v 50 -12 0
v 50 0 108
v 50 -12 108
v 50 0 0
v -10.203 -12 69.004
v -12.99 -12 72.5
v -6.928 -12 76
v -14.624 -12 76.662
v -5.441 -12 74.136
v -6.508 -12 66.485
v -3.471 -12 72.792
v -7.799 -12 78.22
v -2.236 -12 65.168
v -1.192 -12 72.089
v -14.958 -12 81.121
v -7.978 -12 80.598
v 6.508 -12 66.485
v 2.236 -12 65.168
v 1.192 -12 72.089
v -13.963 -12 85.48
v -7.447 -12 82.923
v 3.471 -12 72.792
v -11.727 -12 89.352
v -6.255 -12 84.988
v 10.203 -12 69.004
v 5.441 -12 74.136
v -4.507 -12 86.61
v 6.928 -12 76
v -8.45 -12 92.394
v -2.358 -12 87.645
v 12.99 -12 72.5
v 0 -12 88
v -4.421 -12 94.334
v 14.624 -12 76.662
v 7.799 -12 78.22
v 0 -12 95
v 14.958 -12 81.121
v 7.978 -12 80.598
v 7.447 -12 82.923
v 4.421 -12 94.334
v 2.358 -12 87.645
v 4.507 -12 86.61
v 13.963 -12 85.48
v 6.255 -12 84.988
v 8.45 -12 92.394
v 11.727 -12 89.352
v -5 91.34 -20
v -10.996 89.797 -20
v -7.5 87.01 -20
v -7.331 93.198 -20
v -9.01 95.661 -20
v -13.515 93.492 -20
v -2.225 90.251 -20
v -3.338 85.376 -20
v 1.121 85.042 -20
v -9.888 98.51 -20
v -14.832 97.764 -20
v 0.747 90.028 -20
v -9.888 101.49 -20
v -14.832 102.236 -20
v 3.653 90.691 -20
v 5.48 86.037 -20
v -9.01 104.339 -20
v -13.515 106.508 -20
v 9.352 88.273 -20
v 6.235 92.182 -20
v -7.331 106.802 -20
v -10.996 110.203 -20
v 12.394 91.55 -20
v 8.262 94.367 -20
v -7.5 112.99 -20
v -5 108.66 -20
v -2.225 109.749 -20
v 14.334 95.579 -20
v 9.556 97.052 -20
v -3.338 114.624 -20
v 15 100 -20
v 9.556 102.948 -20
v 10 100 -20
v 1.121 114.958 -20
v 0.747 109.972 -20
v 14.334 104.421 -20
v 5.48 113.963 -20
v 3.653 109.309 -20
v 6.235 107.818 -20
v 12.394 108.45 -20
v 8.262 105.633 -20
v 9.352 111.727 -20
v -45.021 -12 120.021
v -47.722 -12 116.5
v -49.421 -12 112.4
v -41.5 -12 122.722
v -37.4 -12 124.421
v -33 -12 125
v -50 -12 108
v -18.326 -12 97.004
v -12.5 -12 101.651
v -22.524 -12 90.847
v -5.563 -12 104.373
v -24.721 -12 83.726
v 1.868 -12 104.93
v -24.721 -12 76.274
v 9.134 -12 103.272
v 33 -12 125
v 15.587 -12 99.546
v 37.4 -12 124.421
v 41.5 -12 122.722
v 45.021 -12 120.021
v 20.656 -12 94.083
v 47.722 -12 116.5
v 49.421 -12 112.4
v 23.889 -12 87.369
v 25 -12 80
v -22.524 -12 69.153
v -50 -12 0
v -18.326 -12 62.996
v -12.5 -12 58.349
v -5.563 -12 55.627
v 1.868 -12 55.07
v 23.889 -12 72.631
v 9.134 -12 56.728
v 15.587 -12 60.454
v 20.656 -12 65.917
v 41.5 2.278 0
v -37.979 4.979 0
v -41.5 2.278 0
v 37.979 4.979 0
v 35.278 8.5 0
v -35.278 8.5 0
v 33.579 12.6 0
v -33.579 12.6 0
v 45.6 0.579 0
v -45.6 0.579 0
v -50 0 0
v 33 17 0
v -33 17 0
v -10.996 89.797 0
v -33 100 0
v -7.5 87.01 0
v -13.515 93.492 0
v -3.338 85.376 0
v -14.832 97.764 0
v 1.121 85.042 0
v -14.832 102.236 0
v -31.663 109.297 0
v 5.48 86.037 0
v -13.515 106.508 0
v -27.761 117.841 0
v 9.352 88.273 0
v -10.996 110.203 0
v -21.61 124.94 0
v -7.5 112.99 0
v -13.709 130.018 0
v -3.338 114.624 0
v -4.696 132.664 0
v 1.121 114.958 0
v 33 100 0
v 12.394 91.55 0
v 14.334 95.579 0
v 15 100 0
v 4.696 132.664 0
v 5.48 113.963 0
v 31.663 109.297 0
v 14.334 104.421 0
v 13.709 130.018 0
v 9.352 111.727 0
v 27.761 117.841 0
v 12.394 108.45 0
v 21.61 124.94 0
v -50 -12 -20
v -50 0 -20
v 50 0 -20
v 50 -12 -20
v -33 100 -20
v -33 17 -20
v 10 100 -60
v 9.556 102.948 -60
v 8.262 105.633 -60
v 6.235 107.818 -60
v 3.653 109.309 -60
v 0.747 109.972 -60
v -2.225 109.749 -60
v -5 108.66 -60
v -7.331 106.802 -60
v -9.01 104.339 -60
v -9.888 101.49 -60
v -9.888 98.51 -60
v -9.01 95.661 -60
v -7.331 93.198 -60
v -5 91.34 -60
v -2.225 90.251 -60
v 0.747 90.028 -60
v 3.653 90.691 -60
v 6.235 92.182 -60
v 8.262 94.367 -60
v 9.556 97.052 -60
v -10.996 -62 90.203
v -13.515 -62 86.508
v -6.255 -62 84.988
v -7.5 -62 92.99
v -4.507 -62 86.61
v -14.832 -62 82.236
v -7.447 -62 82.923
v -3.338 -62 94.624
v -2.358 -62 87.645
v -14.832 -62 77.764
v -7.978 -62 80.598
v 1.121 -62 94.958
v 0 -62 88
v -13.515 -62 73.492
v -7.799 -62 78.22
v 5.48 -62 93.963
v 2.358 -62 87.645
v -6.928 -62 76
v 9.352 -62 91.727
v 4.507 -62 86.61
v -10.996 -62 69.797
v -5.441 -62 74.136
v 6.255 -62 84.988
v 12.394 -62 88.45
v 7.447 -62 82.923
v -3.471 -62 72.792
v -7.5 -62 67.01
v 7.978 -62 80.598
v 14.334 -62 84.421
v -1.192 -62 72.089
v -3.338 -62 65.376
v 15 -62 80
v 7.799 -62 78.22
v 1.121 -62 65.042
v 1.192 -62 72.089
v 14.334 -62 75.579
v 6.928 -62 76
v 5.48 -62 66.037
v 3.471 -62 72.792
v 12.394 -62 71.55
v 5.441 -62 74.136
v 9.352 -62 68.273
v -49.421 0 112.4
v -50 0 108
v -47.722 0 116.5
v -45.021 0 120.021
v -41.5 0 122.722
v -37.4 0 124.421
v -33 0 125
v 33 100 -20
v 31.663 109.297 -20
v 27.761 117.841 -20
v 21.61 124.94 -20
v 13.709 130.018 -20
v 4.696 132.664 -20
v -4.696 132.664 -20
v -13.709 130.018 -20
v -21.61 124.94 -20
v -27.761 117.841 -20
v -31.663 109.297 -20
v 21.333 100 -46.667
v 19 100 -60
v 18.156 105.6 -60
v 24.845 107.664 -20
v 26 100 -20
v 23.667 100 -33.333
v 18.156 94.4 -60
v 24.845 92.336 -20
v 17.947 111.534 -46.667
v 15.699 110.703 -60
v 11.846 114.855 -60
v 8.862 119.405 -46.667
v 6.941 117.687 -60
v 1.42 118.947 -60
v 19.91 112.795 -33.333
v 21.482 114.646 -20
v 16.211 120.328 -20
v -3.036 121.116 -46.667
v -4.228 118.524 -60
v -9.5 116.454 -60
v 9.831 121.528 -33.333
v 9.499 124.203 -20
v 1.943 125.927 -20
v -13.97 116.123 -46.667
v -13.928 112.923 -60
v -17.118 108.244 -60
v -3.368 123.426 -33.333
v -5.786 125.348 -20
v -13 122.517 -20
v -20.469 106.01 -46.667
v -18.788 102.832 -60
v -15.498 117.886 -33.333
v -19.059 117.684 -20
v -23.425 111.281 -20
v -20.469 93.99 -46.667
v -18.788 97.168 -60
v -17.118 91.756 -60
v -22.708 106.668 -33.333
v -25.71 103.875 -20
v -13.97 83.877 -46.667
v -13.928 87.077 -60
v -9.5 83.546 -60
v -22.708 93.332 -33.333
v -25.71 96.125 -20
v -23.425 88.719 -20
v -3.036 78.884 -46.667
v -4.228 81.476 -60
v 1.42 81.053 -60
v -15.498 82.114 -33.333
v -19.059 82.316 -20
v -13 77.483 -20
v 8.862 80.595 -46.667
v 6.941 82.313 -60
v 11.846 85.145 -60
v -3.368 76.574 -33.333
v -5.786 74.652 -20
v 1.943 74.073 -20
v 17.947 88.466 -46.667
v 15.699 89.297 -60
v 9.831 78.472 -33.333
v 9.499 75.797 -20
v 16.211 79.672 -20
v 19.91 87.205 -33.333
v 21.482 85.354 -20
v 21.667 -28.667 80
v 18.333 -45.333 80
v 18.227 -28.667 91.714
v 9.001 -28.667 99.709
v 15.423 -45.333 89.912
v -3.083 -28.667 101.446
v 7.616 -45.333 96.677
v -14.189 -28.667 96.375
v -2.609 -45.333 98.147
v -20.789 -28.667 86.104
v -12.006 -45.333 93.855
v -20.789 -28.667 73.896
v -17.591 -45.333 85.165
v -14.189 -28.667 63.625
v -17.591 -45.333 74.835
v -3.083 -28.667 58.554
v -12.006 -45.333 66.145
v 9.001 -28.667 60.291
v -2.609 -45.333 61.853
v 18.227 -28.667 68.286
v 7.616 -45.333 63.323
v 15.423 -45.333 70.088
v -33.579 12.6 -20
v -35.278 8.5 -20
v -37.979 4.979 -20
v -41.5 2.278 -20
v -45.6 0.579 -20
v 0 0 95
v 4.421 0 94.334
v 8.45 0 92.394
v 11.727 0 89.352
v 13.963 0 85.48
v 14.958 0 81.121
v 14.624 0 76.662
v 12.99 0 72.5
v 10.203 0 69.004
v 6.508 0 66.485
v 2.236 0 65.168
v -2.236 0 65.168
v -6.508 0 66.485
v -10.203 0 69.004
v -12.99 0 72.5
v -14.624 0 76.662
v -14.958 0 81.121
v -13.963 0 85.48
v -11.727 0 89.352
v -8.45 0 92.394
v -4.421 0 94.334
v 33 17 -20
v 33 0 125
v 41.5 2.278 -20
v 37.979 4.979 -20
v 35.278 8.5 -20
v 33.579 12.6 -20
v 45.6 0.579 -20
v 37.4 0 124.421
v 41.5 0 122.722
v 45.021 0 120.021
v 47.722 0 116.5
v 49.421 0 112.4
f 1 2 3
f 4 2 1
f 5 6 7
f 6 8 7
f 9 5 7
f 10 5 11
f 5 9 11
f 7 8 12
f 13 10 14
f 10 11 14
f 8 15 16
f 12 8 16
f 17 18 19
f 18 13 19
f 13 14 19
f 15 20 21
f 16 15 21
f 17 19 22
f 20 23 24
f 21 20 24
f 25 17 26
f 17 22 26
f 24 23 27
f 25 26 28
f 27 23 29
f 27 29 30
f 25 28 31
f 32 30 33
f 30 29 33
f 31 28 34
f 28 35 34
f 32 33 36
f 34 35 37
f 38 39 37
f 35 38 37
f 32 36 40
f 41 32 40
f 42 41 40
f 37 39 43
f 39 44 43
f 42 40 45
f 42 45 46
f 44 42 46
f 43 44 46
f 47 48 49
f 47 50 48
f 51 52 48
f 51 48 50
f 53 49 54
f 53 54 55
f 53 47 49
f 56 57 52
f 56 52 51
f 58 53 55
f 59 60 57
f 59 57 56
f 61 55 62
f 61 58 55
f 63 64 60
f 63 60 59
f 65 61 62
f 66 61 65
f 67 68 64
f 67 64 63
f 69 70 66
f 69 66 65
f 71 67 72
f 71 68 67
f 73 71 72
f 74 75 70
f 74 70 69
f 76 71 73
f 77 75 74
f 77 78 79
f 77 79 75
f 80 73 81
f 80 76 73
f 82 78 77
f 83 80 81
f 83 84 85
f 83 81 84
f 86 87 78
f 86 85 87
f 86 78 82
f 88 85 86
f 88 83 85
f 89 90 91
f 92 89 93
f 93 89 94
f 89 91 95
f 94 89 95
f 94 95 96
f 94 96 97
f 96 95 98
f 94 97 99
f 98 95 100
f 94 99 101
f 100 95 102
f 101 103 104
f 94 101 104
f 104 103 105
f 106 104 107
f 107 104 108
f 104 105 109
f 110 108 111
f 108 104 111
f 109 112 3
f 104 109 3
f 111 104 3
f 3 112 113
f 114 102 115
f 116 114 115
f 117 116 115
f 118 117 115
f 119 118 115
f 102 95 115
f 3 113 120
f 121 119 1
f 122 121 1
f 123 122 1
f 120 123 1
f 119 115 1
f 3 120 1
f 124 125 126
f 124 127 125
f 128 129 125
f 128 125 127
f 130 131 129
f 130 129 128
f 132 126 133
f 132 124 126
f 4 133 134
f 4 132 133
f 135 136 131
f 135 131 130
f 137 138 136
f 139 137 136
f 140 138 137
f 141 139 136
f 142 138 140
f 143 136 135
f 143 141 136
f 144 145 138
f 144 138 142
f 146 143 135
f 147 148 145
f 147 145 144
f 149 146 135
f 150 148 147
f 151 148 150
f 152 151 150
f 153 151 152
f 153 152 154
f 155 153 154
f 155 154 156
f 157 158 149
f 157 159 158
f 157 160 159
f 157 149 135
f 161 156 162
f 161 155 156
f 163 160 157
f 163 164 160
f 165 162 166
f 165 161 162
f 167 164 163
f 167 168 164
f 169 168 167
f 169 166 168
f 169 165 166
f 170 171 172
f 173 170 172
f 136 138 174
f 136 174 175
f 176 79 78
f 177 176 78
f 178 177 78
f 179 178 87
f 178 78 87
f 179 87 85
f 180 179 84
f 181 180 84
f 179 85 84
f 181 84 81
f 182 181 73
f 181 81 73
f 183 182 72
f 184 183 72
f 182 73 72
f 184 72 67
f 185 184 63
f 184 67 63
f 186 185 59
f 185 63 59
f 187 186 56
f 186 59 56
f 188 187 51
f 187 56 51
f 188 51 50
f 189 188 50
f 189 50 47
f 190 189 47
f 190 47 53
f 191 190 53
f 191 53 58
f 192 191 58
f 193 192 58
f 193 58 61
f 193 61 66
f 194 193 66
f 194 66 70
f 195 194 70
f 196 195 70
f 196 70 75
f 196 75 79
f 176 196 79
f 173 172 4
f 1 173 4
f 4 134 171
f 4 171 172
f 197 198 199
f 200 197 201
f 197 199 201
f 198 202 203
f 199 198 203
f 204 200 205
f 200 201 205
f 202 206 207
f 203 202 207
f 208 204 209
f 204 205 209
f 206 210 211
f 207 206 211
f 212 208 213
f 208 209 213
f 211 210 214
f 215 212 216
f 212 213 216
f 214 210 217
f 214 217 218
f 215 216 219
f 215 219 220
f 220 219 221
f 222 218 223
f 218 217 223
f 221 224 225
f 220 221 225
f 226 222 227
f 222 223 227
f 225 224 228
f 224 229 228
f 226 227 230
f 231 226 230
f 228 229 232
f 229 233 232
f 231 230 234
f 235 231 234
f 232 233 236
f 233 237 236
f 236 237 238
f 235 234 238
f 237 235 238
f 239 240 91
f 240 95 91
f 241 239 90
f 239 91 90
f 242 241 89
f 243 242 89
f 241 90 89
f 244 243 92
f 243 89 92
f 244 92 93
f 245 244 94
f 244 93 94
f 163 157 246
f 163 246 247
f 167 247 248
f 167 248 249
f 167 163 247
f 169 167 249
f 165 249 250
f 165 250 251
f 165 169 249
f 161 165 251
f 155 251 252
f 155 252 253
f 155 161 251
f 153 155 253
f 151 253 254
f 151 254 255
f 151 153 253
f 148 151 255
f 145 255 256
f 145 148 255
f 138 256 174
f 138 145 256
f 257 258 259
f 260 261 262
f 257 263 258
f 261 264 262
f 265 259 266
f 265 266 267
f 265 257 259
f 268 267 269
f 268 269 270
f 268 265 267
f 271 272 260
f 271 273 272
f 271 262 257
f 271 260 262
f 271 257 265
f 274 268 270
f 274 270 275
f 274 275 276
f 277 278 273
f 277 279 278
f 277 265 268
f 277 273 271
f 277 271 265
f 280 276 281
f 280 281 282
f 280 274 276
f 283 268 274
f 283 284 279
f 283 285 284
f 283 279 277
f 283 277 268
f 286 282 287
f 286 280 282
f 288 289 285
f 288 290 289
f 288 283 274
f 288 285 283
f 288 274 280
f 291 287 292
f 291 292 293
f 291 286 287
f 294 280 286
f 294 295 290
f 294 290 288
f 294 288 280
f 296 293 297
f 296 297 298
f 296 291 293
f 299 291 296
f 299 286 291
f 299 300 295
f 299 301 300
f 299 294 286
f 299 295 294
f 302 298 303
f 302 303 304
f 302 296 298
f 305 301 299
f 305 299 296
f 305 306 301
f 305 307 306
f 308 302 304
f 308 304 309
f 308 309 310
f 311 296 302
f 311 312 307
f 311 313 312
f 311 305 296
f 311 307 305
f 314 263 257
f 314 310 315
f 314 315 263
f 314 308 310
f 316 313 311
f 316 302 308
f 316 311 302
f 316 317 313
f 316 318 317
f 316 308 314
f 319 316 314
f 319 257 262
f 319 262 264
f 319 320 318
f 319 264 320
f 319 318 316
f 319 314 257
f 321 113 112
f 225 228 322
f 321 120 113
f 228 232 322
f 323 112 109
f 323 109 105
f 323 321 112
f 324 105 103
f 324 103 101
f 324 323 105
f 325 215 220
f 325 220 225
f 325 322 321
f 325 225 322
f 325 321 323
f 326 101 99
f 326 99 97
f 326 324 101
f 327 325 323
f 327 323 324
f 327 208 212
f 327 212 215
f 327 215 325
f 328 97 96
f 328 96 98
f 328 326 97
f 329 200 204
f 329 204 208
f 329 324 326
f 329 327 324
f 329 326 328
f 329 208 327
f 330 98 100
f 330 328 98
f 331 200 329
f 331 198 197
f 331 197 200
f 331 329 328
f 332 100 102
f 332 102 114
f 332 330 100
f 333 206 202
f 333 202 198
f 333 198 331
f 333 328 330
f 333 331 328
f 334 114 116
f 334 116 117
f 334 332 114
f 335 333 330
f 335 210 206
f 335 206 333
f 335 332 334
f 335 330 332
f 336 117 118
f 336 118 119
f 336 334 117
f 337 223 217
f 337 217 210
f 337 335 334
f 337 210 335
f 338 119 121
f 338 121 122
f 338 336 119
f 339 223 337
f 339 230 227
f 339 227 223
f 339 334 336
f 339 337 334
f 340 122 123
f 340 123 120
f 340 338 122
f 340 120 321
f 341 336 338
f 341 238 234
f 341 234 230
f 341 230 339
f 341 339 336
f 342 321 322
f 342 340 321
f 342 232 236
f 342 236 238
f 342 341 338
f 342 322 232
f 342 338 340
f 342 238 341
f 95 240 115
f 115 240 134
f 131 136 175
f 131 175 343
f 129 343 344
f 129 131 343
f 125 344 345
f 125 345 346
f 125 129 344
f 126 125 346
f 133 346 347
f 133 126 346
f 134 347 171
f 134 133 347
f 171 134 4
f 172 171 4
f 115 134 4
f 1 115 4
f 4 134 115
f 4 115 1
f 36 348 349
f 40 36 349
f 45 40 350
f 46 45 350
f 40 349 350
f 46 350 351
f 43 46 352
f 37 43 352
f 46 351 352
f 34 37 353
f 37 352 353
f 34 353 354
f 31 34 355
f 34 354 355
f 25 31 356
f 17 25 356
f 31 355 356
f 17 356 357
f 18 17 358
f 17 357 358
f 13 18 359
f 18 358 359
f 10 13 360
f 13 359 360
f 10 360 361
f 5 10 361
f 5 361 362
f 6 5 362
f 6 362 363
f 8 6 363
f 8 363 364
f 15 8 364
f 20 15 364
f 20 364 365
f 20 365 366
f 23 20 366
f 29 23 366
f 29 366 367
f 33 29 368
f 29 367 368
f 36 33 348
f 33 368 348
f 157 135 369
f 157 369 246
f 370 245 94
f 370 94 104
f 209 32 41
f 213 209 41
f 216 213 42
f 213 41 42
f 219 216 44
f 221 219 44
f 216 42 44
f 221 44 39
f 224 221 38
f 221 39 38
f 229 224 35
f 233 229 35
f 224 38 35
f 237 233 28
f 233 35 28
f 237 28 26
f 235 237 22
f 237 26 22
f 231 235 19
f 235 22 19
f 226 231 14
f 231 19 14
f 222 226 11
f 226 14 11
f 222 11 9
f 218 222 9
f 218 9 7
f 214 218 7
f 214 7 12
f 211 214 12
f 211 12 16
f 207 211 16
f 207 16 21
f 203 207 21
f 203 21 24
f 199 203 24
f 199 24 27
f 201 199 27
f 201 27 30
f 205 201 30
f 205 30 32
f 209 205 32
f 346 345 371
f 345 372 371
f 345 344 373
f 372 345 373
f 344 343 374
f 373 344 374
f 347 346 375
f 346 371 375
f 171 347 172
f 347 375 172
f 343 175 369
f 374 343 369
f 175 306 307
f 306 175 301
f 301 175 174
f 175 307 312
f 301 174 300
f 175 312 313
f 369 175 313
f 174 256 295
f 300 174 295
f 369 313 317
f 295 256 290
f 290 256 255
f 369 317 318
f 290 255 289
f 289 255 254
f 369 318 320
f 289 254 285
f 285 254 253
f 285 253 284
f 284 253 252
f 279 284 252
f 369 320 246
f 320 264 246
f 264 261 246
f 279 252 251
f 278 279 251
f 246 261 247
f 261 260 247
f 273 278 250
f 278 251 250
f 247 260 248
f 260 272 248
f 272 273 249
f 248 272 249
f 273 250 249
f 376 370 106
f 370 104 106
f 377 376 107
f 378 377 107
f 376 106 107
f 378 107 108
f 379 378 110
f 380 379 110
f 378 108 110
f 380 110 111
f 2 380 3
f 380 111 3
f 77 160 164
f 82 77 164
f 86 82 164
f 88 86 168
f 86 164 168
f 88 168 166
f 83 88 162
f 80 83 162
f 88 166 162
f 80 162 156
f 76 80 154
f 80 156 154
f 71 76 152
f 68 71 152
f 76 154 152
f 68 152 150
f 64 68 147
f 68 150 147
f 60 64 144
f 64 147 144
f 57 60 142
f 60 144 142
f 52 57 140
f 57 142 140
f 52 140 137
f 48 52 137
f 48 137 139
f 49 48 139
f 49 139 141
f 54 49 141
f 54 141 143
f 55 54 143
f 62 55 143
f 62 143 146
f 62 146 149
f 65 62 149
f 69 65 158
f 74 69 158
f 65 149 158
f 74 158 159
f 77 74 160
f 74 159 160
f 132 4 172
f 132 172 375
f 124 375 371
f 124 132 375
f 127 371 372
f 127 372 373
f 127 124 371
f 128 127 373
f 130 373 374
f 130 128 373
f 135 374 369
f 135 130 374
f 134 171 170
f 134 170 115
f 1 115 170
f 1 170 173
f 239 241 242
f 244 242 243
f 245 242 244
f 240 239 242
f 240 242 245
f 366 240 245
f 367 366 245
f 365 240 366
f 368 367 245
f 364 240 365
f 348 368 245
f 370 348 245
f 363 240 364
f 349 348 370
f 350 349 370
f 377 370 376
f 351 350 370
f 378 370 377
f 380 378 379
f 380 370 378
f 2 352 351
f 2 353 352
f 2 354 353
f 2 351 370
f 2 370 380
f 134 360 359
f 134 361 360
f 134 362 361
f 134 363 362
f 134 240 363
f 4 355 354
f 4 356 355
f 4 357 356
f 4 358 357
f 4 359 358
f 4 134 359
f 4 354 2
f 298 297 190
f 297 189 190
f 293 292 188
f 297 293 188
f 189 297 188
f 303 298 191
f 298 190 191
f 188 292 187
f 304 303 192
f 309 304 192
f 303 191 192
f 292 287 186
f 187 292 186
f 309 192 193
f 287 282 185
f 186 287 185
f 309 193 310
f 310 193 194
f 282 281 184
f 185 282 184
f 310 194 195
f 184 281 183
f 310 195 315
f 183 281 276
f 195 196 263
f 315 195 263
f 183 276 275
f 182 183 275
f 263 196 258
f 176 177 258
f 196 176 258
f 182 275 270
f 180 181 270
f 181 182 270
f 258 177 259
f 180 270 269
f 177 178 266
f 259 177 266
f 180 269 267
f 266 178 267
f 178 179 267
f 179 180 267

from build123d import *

# Parameters (mm, degrees)
CROQUIS1_R              = 15
SALIENTE_EXTRUIR1_DEPTH = 20
CROQUIS4_R              = 19
CROQUIS3_R              = 26
CROQUIS5_R              = 10
CORTAR_EXTRUIR1_DEPTH   = 148.610975229
CROQUIS6_W              = 100
CROQUIS6_H              = 125
CROQUIS6_R              = 15
SALIENTE_EXTRUIR2_DEPTH = 12
REDONDEO1_R             = 17
CROQUIS9_R              = 25
CROQUIS8_R              = 15
CROQUIS10_R             = 8
CORTAR_EXTRUIR2_DEPTH   = 198.863589374
CROQUIS11_W             = 100
CROQUIS11_H             = 20
SALIENTE_EXTRUIR3_DEPTH = 12


with BuildPart() as part:
    # Croquis1 → Saliente-Extruir1 (new body)
    with BuildSketch(Plane.XY):
        with BuildLine():
            Line((-50, 0), (50, 0))
            ThreePointArc((50, 0), (37.97918472, 4.97918472), (33, 17))
            Line((33, 17), (33, 100))
            ThreePointArc((33, 100), (0, 133), (-33, 100))
            Line((-33, 100), (-33, 17))
            ThreePointArc((-33, 17), (-37.97918472, 4.97918472), (-50, 0))
        make_face()
        with Locations((0, 100)):
            Circle(CROQUIS1_R, mode=Mode.SUBTRACT)
    extrude(amount=-SALIENTE_EXTRUIR1_DEPTH)

    # Croquis4 → Recubrir1 section 0
    with BuildSketch(Plane.XY.offset(-60)):
        with Locations((0, 100)):
            Circle(CROQUIS4_R)
    # Croquis3 → Recubrir1 section 1
    with BuildSketch(Plane.XY.offset(-20)):
        with Locations((0, 100)):
            Circle(CROQUIS3_R)
    loft()

    # Croquis5 → Cortar-Extruir1 (cut, through all)
    with BuildSketch(Plane.XY.offset(-20)):
        with Locations((0, 100)):
            Circle(CROQUIS5_R)
    extrude(amount=-CORTAR_EXTRUIR1_DEPTH, mode=Mode.SUBTRACT)


with BuildPart() as body_2:
    # Croquis6 → Saliente-Extruir2 (new body)
    with BuildSketch(Plane(origin=(0, 0, 0), x_dir=(1, 0, 0), z_dir=(0, 1, 0))):
        with Locations((0, -62.5)):
            Rectangle(CROQUIS6_W, CROQUIS6_H)
        with Locations(Location((0, -80, 0), (0, 0, 270))):
            Circle(CROQUIS6_R, mode=Mode.SUBTRACT)
    extrude(amount=-SALIENTE_EXTRUIR2_DEPTH)

    # Redondeo1
    redondeo1_edges = [body_2.edges().sort_by_distance(p)[0] for p in [
        (50, -6, 125),
        (-50, -6, 125),
    ]]
    fillet(redondeo1_edges, radius=REDONDEO1_R)

    # Croquis9 → Recubrir2 section 0
    with BuildSketch(Plane.XZ.offset(12)):
        with Locations((0, 80)):
            Circle(CROQUIS9_R)
    # Croquis8 → Recubrir2 section 1
    with BuildSketch(Plane(origin=(0, -62, 0), x_dir=(1, 0, 0), z_dir=(0, 1, 0))):
        with Locations((0, -80)):
            Circle(CROQUIS8_R)
    loft()

    # Croquis10 → Cortar-Extruir2 (cut, through all)
    with BuildSketch(Plane(origin=(0, -12, 0), x_dir=(1, 0, 0), z_dir=(0, 1, 0))):
        with Locations(Location((0, -80, 0), (0, 0, 270))):
            Circle(CROQUIS10_R)
    extrude(amount=-CORTAR_EXTRUIR2_DEPTH, mode=Mode.SUBTRACT)


with BuildPart() as body_3:
    # Croquis11 → Saliente-Extruir3 (new body)
    with BuildSketch(Plane.XZ):
        with Locations((0, -10)):
            Rectangle(CROQUIS11_W, CROQUIS11_H)
    extrude(amount=SALIENTE_EXTRUIR3_DEPTH)


solid = Compound([part.part, body_2.part, body_3.part])
